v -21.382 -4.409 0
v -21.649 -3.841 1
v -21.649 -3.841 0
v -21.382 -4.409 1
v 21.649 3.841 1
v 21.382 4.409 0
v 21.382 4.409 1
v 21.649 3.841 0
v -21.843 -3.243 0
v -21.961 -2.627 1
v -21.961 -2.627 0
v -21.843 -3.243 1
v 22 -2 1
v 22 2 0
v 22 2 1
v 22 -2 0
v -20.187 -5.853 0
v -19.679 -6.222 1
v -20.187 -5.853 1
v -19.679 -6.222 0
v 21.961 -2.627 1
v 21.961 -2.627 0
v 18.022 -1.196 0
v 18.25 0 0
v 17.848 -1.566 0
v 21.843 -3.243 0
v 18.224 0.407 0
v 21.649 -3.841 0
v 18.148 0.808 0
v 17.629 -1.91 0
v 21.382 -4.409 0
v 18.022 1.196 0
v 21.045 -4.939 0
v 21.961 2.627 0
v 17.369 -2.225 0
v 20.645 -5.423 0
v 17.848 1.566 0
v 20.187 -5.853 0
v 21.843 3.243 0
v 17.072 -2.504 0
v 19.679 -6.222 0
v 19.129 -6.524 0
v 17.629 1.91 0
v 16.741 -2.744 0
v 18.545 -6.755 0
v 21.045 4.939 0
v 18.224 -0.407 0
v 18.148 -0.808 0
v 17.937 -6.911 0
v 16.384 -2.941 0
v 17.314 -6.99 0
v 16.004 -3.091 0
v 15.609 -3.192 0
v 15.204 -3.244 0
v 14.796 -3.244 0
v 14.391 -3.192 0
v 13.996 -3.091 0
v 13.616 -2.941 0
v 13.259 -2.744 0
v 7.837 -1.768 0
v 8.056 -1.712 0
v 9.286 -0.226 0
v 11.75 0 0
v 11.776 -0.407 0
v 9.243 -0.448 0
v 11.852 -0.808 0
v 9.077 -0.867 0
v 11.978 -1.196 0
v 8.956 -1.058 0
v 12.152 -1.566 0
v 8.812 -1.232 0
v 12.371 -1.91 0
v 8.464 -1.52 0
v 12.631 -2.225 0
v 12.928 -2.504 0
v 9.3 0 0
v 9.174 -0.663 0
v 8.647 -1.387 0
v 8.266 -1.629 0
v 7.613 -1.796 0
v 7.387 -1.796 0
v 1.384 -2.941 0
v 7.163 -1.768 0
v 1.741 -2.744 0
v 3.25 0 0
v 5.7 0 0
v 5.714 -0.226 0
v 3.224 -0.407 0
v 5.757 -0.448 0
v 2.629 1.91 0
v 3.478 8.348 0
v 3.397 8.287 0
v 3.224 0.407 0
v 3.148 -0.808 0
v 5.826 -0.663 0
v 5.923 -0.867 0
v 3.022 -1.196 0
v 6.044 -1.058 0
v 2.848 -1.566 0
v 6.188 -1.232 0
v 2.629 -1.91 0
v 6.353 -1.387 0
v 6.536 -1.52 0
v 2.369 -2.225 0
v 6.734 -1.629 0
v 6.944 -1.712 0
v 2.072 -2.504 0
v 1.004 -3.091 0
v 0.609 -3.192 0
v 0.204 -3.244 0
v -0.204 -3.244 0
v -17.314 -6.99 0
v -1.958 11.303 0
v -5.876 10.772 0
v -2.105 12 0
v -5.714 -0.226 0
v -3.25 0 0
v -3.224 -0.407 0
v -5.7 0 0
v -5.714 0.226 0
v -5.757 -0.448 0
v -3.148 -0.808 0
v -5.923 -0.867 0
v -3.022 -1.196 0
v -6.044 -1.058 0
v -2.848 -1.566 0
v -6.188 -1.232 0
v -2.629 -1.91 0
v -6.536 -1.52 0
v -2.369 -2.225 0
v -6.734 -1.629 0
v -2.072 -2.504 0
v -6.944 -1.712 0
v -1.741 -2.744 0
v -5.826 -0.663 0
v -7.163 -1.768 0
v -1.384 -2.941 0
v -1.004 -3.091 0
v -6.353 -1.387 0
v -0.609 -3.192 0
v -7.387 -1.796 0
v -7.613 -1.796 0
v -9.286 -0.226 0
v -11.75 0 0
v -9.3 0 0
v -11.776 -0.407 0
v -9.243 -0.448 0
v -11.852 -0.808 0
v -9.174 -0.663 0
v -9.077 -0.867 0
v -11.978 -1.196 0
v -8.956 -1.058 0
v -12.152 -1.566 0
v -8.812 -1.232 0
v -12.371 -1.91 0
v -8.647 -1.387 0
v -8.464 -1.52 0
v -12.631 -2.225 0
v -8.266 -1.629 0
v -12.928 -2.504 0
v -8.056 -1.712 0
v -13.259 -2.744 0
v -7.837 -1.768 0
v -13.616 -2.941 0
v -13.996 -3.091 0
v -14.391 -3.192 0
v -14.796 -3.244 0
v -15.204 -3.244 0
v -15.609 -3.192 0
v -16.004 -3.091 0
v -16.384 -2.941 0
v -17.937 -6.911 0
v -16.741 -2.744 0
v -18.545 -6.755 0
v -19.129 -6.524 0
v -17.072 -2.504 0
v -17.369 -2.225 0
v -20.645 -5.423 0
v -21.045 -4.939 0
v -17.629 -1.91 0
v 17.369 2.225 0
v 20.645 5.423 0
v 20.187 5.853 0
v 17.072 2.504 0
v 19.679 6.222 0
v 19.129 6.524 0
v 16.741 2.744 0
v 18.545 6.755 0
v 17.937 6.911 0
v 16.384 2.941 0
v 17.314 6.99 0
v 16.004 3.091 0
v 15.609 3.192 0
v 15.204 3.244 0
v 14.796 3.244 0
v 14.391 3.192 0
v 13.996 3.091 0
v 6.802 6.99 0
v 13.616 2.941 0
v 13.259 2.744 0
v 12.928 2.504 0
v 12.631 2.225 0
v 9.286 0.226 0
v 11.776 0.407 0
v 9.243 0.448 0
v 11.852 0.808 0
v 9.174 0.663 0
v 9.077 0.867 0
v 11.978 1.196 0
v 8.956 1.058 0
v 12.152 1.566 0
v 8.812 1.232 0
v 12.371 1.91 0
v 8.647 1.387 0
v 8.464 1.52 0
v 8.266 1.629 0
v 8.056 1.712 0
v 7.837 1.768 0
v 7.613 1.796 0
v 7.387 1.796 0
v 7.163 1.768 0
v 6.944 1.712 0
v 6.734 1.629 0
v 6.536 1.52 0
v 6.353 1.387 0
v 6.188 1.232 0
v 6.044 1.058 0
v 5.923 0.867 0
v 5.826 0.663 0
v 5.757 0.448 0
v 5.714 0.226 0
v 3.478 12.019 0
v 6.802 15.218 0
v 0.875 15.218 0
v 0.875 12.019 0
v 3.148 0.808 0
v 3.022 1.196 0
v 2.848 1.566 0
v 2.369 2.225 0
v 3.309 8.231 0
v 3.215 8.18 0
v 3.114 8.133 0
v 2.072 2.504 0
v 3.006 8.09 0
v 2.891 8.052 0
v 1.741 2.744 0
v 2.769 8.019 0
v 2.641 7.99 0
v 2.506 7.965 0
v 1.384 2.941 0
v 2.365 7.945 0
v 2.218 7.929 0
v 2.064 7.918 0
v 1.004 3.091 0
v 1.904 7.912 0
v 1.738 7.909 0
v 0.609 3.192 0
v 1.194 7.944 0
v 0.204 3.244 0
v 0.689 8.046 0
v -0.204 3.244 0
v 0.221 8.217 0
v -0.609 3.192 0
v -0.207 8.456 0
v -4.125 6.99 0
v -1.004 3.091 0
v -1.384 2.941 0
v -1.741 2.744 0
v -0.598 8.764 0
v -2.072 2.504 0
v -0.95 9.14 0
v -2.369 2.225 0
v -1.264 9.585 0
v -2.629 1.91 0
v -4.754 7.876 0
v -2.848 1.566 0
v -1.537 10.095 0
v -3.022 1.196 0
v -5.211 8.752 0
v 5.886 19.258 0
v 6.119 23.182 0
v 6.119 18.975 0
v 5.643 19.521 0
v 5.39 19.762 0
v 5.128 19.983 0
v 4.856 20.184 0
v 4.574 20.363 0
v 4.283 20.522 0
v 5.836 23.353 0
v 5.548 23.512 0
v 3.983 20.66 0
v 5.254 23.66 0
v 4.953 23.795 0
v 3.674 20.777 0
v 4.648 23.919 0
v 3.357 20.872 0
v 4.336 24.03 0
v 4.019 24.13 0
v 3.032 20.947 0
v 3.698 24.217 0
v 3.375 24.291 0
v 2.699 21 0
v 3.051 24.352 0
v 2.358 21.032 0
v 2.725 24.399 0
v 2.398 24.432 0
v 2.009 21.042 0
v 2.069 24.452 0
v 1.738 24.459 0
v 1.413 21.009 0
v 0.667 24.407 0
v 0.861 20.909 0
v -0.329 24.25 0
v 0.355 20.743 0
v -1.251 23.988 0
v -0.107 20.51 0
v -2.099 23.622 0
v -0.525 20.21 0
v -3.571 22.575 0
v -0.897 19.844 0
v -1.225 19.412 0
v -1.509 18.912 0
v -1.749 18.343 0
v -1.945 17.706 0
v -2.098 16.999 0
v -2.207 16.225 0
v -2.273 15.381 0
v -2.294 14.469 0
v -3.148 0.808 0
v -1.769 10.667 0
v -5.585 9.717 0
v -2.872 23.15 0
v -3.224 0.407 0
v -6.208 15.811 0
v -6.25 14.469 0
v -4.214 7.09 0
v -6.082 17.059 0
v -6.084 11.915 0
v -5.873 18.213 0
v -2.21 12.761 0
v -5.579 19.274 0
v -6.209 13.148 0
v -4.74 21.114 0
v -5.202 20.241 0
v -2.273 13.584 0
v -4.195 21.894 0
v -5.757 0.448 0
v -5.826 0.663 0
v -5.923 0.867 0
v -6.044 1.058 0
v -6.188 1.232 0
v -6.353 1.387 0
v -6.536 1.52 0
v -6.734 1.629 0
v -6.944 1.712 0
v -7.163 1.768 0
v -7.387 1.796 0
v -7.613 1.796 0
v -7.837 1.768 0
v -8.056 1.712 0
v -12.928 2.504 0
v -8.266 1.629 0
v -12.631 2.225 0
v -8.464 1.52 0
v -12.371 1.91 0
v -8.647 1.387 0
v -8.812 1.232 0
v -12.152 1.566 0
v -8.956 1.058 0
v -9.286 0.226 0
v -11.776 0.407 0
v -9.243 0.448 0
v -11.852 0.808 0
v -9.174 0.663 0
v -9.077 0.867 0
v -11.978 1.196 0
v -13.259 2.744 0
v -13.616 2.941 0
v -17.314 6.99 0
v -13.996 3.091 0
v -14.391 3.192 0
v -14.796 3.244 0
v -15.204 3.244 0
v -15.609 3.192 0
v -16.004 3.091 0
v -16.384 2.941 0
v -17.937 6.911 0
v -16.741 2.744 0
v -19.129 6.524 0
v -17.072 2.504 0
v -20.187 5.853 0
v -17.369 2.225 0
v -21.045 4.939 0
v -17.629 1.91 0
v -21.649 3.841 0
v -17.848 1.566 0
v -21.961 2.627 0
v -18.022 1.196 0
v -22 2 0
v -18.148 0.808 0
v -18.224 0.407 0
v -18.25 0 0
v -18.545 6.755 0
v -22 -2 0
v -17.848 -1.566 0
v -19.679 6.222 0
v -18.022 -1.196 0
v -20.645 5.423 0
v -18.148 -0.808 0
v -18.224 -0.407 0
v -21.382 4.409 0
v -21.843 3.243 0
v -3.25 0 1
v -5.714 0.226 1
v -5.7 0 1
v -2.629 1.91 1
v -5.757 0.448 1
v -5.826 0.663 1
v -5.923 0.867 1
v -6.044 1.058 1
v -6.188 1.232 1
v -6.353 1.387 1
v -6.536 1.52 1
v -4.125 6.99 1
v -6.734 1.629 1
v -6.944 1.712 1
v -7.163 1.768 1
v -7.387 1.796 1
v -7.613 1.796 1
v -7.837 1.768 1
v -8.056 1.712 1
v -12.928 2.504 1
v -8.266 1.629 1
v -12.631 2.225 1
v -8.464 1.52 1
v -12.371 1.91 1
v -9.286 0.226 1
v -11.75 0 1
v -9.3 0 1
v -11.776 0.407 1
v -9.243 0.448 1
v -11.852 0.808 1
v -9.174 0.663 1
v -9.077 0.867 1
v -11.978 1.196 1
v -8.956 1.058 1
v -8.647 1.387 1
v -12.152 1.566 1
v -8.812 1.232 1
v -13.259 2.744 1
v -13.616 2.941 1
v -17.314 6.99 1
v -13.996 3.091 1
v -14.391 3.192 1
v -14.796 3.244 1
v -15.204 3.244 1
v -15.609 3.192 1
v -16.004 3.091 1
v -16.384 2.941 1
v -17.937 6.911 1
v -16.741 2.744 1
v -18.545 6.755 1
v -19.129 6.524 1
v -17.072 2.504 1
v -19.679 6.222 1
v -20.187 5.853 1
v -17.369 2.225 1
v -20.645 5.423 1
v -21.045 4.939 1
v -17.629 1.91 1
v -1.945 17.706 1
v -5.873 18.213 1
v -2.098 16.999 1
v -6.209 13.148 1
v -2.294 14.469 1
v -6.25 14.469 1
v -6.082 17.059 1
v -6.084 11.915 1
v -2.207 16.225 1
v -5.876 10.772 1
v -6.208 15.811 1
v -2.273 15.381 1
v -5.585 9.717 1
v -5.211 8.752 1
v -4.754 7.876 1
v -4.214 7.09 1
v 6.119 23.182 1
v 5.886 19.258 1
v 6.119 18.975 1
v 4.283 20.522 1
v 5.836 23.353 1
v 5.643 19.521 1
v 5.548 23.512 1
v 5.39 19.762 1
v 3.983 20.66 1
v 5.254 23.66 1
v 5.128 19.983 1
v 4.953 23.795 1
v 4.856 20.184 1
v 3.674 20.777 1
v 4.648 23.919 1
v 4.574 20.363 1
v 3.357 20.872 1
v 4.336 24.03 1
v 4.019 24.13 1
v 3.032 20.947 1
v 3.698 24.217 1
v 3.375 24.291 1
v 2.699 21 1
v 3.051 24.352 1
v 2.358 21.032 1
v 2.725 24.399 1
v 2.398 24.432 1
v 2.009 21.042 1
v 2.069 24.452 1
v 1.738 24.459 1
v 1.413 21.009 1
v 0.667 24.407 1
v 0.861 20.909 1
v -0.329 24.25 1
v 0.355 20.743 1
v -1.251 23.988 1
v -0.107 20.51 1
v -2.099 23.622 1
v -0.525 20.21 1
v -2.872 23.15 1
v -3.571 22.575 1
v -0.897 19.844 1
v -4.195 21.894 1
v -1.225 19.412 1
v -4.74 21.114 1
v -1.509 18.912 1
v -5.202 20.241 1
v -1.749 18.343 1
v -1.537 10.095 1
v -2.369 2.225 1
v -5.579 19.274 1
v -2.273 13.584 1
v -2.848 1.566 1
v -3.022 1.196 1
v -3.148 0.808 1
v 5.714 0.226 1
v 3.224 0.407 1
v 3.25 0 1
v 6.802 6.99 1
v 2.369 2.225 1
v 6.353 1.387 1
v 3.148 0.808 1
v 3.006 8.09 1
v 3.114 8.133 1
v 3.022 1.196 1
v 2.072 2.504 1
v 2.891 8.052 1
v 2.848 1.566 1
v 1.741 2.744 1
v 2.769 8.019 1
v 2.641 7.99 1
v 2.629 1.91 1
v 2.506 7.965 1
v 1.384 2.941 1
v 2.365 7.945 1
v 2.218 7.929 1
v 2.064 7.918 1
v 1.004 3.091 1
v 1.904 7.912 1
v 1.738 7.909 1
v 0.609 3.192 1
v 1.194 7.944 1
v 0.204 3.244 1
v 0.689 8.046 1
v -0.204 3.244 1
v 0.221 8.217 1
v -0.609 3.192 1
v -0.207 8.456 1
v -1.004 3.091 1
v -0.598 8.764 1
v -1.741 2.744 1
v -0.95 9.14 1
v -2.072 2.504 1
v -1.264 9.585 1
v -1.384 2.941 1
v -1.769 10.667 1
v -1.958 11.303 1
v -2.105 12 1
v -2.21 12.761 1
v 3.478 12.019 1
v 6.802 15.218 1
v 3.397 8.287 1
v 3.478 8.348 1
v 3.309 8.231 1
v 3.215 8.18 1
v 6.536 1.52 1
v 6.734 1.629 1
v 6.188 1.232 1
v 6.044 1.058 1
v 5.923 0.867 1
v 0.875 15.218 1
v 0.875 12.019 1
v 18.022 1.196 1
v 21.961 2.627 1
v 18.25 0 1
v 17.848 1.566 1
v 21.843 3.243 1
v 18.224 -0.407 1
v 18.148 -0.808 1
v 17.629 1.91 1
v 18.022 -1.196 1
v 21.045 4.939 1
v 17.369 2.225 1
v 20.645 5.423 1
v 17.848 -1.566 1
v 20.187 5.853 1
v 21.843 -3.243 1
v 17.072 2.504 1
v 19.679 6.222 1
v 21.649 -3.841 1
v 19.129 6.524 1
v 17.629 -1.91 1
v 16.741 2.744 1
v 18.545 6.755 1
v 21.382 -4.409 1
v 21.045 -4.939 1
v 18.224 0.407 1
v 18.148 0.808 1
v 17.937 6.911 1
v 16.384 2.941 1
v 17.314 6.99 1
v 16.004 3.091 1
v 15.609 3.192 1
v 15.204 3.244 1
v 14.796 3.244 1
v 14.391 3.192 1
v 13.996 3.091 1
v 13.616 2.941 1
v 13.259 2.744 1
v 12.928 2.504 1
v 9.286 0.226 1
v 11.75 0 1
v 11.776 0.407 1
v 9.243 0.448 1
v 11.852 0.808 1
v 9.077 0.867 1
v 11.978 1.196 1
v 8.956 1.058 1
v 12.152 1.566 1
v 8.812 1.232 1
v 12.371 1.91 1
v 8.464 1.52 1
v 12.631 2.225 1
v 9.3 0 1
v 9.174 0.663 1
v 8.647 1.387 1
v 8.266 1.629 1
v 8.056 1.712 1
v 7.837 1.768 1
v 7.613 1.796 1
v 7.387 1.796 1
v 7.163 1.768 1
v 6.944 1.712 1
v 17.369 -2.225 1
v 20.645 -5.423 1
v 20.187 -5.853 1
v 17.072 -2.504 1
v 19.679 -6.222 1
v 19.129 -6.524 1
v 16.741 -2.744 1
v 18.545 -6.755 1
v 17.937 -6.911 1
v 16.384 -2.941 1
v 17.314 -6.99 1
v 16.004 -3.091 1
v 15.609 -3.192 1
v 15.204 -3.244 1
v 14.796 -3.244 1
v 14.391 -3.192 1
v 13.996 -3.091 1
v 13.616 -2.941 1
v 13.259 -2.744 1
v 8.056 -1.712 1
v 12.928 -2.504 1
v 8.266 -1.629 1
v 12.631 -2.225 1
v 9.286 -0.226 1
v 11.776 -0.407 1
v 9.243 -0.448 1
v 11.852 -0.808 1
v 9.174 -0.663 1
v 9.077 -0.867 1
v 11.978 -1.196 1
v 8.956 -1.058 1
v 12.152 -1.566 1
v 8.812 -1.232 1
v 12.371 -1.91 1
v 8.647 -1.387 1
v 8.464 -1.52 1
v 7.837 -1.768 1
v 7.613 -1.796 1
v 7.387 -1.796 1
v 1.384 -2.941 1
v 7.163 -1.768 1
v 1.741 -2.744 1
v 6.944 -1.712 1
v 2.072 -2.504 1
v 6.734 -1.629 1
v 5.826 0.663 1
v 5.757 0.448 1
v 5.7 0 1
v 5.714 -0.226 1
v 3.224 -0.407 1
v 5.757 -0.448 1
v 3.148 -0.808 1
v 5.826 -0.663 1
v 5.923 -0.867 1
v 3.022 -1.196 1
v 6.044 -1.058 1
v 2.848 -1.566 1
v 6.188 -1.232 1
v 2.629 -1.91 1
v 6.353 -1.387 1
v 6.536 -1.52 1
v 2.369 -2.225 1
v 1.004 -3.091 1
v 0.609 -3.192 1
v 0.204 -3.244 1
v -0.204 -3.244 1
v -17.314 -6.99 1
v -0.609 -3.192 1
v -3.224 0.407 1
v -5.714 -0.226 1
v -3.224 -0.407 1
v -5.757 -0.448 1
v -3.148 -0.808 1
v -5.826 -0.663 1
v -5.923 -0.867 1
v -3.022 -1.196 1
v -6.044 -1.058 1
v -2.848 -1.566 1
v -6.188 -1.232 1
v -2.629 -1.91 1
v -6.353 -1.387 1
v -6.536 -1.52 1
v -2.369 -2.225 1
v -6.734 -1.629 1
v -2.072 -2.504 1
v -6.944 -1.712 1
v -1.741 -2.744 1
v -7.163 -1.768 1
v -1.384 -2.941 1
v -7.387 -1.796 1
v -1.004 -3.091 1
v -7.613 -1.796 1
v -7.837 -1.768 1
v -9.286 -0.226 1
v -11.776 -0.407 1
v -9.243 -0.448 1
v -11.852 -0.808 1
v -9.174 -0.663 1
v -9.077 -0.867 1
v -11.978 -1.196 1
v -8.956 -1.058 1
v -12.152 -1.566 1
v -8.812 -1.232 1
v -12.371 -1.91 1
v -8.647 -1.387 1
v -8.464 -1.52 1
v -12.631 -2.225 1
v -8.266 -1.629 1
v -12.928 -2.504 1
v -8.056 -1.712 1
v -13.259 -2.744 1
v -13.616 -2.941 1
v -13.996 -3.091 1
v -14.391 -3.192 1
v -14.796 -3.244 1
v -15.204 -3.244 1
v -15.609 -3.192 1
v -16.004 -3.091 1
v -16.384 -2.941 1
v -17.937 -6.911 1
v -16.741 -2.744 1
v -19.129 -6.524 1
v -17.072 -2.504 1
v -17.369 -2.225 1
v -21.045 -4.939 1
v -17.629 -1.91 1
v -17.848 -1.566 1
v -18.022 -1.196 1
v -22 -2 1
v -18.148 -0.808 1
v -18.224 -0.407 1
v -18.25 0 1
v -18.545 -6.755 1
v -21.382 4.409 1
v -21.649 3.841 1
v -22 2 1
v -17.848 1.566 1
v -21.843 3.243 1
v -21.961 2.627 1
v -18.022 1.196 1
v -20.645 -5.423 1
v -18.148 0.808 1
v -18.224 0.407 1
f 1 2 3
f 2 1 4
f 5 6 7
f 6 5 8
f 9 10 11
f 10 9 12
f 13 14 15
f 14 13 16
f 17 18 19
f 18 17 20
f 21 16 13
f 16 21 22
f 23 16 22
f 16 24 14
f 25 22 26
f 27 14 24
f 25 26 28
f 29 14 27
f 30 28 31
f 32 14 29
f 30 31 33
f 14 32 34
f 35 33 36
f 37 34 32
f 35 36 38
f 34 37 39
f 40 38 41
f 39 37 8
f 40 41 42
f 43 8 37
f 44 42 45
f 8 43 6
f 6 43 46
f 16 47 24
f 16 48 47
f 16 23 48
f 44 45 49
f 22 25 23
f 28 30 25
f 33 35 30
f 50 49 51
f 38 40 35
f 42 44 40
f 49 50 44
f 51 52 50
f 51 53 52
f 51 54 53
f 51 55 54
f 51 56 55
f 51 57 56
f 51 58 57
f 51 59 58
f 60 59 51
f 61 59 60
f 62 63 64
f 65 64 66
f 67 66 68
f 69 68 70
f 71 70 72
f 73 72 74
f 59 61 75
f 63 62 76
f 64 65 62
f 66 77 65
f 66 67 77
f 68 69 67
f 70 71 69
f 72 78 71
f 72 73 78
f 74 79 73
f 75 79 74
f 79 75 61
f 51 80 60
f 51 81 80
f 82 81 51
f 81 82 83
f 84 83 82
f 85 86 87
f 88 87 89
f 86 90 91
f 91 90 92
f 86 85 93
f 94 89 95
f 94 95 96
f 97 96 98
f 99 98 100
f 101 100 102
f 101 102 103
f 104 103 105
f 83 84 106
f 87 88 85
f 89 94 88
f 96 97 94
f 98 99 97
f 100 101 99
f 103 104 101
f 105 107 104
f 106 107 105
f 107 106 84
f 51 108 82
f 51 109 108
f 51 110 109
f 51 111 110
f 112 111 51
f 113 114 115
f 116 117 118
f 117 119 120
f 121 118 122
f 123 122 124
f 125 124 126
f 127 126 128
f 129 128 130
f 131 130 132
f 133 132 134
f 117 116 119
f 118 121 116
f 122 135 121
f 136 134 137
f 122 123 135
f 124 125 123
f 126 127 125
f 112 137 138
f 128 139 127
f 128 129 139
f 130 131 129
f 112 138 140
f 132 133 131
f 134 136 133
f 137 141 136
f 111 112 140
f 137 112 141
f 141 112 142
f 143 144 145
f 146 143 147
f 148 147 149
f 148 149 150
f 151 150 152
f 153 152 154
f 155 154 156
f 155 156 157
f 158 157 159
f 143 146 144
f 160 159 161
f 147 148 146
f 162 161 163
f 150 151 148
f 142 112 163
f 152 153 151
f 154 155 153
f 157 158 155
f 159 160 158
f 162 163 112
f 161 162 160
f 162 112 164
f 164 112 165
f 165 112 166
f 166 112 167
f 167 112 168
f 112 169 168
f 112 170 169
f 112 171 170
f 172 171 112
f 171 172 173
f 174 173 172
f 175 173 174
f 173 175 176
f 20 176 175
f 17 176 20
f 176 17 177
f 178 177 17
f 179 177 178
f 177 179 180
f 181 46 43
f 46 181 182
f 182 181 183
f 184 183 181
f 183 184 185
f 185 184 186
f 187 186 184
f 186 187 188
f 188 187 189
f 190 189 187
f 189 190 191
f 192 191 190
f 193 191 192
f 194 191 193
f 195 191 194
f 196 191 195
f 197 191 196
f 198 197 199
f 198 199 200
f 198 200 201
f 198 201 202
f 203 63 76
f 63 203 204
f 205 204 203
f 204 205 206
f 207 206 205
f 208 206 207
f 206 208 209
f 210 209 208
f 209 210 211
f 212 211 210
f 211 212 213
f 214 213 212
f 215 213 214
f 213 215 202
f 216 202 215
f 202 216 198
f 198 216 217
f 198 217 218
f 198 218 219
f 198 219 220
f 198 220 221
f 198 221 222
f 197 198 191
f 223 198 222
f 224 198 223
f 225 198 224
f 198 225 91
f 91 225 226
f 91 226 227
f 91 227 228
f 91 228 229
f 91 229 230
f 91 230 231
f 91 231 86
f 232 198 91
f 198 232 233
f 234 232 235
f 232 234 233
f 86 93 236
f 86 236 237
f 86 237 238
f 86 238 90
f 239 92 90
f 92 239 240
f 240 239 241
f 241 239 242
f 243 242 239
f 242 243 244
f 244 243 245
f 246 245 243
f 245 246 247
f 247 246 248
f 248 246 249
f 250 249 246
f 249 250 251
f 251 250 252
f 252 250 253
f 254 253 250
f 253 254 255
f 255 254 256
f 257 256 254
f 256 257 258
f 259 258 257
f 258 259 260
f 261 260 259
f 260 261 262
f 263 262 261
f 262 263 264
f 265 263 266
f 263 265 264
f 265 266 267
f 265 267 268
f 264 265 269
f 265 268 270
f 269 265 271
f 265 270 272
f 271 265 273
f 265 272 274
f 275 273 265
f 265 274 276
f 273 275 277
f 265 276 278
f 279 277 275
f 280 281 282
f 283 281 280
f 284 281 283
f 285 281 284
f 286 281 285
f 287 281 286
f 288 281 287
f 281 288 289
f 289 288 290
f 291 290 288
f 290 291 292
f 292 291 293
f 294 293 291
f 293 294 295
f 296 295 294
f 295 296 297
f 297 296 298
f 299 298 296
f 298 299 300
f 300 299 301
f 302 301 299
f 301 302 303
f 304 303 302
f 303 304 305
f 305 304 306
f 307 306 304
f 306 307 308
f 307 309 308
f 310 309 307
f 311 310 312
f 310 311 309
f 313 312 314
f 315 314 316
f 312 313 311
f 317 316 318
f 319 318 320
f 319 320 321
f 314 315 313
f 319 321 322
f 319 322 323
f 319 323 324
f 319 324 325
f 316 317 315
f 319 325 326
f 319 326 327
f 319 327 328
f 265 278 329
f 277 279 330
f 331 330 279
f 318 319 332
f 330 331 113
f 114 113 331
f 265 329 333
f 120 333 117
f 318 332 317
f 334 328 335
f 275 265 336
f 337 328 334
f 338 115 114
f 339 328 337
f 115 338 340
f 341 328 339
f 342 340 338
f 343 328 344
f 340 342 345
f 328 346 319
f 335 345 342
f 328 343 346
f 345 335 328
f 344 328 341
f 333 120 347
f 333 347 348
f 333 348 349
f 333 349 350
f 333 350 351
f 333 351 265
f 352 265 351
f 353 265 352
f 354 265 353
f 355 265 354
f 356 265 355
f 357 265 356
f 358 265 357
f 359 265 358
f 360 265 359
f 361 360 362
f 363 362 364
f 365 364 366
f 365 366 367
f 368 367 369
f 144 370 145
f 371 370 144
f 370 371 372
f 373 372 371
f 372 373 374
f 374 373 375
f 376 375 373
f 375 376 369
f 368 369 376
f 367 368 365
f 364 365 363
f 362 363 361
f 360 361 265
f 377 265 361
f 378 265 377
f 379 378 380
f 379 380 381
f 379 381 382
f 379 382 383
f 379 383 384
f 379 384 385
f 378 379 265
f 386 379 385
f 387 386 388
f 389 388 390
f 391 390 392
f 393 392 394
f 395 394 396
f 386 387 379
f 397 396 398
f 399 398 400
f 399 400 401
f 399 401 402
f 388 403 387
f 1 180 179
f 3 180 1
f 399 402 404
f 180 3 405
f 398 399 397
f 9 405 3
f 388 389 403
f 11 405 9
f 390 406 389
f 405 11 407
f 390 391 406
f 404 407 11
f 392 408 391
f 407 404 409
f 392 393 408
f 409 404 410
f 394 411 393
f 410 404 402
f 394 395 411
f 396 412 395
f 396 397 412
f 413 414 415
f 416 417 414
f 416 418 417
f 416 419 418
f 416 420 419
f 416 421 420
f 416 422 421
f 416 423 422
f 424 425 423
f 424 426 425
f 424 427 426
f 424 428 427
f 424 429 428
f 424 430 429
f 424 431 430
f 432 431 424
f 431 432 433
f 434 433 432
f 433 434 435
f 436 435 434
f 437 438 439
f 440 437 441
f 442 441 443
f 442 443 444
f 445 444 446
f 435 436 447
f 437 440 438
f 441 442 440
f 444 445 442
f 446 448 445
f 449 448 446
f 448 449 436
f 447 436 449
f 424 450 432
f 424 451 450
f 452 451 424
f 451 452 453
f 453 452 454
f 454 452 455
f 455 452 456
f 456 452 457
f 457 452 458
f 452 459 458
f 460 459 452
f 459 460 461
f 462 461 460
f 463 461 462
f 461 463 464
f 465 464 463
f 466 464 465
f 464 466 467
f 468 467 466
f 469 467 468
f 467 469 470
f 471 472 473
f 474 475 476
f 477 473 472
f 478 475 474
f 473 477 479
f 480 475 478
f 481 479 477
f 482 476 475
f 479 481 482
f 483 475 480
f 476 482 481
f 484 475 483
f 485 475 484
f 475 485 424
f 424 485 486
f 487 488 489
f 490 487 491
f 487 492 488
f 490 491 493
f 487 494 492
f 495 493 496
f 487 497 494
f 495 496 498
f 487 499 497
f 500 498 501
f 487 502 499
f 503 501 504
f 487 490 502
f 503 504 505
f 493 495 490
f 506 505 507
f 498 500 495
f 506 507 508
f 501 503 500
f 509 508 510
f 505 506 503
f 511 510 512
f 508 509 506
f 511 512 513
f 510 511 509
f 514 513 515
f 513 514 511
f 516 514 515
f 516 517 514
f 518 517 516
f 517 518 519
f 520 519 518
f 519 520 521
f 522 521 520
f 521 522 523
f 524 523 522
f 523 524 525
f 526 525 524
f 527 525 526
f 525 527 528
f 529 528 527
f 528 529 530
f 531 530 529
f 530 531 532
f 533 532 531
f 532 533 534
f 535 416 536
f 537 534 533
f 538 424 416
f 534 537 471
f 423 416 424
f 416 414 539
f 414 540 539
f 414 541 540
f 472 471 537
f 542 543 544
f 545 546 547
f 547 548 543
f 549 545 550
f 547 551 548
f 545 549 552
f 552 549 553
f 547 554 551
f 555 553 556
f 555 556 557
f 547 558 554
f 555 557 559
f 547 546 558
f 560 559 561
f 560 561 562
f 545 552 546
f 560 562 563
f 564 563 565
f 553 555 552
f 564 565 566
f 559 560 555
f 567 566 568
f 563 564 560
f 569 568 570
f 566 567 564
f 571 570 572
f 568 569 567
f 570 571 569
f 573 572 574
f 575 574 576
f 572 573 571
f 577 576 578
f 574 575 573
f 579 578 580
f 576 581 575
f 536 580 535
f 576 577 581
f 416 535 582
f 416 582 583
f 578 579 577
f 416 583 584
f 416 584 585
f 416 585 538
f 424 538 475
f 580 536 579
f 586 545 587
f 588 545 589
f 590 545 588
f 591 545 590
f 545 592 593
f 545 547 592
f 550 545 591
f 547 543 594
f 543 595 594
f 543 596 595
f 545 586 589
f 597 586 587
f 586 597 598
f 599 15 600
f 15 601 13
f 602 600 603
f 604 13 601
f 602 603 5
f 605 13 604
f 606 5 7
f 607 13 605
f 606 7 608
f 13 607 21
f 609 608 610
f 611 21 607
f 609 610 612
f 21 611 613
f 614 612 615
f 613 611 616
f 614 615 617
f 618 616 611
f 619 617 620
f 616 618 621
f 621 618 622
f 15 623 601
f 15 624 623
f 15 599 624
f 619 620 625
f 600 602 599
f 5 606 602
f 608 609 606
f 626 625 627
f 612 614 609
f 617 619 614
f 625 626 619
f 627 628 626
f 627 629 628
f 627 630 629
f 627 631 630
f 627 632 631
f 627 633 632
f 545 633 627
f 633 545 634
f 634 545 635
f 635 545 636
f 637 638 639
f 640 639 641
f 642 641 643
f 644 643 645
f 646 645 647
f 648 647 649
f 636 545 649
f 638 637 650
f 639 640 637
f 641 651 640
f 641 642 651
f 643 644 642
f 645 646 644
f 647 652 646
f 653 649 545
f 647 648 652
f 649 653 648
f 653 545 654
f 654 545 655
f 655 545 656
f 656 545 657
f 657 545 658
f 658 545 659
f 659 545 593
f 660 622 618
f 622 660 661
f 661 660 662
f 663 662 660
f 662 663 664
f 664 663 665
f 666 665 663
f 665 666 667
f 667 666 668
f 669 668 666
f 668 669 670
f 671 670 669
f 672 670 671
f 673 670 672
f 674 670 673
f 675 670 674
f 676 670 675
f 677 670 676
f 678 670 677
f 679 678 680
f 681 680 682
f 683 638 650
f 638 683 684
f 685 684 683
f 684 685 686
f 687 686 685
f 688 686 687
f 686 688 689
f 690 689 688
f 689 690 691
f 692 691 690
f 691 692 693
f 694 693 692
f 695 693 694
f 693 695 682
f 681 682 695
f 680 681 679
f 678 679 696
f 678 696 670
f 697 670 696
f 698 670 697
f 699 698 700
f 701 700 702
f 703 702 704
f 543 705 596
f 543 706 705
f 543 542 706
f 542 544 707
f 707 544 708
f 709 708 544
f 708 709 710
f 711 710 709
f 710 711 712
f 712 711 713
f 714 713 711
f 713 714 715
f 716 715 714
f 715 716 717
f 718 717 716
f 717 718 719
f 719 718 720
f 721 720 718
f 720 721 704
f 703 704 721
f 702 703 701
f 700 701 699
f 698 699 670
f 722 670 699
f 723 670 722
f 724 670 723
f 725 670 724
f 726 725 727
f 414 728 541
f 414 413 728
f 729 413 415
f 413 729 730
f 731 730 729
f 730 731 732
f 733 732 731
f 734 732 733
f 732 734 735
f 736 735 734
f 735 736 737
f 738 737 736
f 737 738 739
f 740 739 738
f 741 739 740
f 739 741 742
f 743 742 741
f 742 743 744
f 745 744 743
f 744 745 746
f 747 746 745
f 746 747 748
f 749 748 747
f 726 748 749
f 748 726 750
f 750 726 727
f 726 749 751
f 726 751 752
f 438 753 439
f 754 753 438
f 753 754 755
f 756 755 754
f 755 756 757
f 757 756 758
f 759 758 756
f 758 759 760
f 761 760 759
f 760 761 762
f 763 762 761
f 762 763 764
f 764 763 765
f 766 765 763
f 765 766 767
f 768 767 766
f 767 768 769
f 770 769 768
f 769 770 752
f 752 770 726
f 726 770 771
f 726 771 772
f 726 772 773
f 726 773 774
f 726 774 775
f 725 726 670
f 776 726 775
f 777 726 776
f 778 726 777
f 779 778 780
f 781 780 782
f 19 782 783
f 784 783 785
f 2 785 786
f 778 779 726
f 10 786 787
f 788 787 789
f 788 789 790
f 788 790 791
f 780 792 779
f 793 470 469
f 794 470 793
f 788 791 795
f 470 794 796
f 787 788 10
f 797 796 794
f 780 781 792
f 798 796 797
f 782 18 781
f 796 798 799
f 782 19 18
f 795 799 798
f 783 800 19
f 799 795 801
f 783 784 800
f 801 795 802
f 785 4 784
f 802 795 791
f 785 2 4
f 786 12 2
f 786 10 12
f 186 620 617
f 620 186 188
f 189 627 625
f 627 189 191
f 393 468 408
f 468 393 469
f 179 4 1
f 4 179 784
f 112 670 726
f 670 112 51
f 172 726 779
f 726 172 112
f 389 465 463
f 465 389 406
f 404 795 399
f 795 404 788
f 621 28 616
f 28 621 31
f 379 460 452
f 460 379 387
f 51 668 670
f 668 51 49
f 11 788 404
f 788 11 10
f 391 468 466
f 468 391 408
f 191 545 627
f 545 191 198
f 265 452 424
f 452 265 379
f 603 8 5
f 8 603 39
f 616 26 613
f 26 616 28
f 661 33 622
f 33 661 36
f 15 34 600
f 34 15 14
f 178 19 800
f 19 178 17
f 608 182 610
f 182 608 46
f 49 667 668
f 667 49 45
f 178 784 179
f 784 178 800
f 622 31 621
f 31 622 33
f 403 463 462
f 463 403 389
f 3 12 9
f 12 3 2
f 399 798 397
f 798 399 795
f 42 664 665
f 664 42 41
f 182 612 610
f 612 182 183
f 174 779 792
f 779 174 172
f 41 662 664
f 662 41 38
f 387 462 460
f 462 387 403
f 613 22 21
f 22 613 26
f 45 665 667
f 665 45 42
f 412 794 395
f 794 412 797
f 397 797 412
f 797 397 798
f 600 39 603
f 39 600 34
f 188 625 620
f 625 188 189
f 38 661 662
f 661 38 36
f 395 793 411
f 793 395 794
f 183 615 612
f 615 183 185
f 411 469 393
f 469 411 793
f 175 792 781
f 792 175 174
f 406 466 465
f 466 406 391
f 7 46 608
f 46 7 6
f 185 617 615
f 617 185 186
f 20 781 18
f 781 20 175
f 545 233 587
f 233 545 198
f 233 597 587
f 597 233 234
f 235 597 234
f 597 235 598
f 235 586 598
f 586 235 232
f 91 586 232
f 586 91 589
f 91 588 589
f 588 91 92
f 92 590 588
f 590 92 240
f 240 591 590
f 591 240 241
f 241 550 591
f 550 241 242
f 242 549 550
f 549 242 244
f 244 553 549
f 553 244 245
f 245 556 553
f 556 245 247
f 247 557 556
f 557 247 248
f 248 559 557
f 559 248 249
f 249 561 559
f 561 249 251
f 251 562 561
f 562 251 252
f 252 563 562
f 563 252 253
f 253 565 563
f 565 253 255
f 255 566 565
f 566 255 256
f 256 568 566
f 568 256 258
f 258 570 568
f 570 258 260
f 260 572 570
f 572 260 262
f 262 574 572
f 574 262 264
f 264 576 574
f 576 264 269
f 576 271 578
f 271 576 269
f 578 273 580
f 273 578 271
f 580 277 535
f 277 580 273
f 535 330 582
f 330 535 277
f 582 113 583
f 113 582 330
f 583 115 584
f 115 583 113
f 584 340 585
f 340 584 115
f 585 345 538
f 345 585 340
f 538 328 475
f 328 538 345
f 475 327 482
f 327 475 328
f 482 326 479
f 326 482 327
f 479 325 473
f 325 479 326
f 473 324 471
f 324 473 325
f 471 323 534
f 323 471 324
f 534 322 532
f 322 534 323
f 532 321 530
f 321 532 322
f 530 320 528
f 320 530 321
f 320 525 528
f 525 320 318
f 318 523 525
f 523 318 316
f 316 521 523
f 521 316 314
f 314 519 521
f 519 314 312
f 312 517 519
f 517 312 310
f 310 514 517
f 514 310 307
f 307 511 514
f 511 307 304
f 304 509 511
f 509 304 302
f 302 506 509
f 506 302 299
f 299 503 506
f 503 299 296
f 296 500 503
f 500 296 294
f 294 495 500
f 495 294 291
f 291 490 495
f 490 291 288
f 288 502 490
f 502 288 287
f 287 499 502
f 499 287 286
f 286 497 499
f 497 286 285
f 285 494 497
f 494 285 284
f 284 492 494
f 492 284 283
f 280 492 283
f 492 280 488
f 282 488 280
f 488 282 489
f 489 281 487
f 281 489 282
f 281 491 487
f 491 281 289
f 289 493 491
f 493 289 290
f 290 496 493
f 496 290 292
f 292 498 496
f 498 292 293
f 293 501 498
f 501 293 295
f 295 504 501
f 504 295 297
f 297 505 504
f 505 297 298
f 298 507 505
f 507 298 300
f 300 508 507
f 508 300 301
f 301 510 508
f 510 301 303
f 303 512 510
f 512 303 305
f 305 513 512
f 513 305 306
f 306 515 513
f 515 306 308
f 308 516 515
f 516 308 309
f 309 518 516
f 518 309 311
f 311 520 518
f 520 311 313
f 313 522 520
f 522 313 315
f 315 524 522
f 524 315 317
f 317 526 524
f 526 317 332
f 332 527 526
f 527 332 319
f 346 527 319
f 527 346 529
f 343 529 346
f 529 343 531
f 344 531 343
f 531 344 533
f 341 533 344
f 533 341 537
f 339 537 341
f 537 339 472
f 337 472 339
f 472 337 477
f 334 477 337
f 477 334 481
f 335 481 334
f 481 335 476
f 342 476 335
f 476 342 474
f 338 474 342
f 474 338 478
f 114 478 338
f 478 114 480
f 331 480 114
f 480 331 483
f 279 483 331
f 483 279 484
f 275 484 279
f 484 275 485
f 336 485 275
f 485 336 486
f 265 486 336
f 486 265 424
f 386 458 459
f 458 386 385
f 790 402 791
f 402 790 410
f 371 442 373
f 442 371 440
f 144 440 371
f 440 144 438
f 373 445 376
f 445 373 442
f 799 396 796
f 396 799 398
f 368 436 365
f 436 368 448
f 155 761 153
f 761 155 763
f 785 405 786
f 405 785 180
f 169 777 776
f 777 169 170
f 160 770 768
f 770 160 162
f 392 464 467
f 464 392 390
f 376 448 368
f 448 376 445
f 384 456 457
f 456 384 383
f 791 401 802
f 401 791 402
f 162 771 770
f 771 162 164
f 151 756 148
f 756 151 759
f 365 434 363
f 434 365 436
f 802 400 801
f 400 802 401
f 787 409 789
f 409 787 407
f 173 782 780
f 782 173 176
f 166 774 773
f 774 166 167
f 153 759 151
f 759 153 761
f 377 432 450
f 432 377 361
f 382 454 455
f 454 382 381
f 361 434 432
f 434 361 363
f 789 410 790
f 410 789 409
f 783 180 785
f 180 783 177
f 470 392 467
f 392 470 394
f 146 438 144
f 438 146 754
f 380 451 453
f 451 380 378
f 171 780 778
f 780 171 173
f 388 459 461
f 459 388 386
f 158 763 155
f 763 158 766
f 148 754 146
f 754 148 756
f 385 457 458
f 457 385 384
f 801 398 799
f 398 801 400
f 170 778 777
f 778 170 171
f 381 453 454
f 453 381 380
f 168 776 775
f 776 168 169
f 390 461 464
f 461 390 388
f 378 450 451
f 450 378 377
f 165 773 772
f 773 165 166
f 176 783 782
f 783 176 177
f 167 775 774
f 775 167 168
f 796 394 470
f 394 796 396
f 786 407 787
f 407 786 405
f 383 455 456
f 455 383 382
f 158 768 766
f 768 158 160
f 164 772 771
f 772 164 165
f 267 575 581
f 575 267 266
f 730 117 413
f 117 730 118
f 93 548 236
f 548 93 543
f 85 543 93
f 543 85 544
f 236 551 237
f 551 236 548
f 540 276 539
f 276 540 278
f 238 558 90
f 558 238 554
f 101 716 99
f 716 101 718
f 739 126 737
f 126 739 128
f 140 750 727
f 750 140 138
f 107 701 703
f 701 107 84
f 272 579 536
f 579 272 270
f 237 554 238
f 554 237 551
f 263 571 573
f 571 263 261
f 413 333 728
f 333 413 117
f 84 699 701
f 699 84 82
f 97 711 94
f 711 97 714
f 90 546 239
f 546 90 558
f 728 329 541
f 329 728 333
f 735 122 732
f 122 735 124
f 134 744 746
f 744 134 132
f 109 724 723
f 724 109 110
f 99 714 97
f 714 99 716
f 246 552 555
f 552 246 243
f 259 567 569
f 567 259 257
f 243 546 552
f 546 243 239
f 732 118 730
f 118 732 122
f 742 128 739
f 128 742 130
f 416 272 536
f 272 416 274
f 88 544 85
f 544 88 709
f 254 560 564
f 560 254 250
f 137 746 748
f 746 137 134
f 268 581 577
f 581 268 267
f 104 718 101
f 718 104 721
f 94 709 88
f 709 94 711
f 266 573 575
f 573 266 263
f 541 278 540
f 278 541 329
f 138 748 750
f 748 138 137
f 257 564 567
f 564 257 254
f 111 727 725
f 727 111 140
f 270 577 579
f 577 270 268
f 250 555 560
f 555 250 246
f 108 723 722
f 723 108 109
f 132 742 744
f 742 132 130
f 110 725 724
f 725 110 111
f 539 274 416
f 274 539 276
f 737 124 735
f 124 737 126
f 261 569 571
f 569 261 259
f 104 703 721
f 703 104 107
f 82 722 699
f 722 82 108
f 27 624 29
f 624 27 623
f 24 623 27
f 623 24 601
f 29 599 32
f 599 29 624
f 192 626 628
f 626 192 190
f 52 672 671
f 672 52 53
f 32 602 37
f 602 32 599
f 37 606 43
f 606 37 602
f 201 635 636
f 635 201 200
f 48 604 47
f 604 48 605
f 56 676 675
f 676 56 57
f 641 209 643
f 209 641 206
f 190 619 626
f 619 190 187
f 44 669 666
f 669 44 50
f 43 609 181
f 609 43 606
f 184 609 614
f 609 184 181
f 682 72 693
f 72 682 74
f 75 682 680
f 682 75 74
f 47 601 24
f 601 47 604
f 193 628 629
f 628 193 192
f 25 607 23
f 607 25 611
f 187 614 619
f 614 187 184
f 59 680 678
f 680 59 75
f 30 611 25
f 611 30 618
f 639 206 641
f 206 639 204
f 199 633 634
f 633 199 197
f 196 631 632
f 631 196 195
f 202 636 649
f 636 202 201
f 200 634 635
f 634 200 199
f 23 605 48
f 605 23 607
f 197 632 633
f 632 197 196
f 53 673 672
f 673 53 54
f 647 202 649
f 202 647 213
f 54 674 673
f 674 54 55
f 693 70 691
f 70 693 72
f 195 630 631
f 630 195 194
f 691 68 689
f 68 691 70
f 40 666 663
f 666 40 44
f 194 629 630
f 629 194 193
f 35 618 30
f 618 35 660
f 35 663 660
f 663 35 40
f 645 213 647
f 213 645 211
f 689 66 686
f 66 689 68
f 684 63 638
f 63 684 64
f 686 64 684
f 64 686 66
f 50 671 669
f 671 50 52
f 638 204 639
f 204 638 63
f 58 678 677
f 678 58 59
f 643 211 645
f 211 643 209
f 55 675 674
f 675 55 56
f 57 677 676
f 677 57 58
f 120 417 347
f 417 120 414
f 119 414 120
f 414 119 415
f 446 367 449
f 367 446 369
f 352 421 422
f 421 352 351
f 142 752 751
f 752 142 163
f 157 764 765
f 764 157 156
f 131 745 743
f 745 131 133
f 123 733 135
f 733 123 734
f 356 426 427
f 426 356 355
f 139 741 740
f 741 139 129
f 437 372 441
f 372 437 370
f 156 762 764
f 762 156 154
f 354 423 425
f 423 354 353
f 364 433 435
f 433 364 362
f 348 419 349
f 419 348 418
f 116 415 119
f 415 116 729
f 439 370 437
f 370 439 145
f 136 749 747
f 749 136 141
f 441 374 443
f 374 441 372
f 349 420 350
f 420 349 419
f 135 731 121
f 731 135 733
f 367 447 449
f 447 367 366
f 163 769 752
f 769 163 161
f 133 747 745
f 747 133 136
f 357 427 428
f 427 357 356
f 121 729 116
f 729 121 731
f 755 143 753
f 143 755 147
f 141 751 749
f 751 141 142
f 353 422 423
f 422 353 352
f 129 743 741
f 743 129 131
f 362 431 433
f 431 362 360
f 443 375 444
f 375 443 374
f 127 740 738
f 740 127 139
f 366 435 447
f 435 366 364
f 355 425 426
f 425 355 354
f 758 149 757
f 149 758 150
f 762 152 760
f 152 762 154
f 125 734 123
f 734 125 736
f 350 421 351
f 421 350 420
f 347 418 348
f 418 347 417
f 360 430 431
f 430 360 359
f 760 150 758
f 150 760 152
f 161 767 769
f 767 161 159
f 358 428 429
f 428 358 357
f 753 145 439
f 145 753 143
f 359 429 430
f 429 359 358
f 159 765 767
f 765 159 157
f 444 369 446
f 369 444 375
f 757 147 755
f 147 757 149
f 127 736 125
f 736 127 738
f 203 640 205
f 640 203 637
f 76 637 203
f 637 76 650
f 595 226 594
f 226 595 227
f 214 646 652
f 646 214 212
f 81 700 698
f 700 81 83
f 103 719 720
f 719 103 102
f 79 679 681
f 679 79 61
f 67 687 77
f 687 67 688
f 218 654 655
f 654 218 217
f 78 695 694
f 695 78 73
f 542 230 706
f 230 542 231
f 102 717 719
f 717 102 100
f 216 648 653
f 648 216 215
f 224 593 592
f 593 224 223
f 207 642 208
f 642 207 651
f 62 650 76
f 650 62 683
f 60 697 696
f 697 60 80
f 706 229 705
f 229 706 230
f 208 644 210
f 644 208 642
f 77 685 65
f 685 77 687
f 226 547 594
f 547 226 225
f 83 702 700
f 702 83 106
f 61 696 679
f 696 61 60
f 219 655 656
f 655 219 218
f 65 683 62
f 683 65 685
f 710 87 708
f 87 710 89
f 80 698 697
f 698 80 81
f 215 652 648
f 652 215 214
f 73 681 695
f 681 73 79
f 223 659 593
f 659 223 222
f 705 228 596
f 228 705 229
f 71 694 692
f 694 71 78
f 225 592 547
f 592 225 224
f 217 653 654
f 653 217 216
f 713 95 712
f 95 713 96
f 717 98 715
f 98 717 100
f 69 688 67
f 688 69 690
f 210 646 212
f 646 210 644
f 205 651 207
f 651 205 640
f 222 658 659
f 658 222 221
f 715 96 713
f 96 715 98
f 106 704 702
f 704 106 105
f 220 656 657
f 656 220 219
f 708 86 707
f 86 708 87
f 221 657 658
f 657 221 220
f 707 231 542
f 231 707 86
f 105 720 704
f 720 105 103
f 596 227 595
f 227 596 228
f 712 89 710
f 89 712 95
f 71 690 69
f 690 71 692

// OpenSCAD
$fn = 50;


difference() {
	union() {
		hull() {
			translate(v = [-17.0000000000, 2.0000000000, 0]) {
				cylinder(h = 1, r = 5);
			}
			translate(v = [17.0000000000, 2.0000000000, 0]) {
				cylinder(h = 1, r = 5);
			}
			translate(v = [-17.0000000000, -2.0000000000, 0]) {
				cylinder(h = 1, r = 5);
			}
			translate(v = [17.0000000000, -2.0000000000, 0]) {
				cylinder(h = 1, r = 5);
			}
		}
		translate(v = [0, 24, 0]) {
			linear_extrude(height = 1) {
				text(font = "DejaVu Sans Mono:style=Bold", halign = "center", size = 19.0000000000, text = "G", valign = "top");
			}
		}
	}
	union() {
		translate(v = [-15.0000000000, 0.0000000000, 0]) {
			translate(v = [0, 0, -100]) {
				cylinder(h = 200, r = 3.2500000000);
			}
		}
		translate(v = [0, 0, -100]) {
			cylinder(h = 200, r = 3.2500000000);
		}
		translate(v = [15.0000000000, 0.0000000000, 0]) {
			translate(v = [0, 0, -100]) {
				cylinder(h = 200, r = 3.2500000000);
			}
		}
		translate(v = [-15.0000000000, 0.0000000000, 0]) {
			translate(v = [0, 0, -100]) {
				cylinder(h = 200, r = 1.8000000000);
			}
		}
		translate(v = [-7.5000000000, 0.0000000000, 0]) {
			translate(v = [0, 0, -100]) {
				cylinder(h = 200, r = 1.8000000000);
			}
		}
		translate(v = [0, 0, -100]) {
			cylinder(h = 200, r = 1.8000000000);
		}
		translate(v = [7.5000000000, 0.0000000000, 0]) {
			translate(v = [0, 0, -100]) {
				cylinder(h = 200, r = 1.8000000000);
			}
		}
		translate(v = [15.0000000000, 0.0000000000, 0]) {
			translate(v = [0, 0, -100]) {
				cylinder(h = 200, r = 1.8000000000);
			}
		}
	}
}
